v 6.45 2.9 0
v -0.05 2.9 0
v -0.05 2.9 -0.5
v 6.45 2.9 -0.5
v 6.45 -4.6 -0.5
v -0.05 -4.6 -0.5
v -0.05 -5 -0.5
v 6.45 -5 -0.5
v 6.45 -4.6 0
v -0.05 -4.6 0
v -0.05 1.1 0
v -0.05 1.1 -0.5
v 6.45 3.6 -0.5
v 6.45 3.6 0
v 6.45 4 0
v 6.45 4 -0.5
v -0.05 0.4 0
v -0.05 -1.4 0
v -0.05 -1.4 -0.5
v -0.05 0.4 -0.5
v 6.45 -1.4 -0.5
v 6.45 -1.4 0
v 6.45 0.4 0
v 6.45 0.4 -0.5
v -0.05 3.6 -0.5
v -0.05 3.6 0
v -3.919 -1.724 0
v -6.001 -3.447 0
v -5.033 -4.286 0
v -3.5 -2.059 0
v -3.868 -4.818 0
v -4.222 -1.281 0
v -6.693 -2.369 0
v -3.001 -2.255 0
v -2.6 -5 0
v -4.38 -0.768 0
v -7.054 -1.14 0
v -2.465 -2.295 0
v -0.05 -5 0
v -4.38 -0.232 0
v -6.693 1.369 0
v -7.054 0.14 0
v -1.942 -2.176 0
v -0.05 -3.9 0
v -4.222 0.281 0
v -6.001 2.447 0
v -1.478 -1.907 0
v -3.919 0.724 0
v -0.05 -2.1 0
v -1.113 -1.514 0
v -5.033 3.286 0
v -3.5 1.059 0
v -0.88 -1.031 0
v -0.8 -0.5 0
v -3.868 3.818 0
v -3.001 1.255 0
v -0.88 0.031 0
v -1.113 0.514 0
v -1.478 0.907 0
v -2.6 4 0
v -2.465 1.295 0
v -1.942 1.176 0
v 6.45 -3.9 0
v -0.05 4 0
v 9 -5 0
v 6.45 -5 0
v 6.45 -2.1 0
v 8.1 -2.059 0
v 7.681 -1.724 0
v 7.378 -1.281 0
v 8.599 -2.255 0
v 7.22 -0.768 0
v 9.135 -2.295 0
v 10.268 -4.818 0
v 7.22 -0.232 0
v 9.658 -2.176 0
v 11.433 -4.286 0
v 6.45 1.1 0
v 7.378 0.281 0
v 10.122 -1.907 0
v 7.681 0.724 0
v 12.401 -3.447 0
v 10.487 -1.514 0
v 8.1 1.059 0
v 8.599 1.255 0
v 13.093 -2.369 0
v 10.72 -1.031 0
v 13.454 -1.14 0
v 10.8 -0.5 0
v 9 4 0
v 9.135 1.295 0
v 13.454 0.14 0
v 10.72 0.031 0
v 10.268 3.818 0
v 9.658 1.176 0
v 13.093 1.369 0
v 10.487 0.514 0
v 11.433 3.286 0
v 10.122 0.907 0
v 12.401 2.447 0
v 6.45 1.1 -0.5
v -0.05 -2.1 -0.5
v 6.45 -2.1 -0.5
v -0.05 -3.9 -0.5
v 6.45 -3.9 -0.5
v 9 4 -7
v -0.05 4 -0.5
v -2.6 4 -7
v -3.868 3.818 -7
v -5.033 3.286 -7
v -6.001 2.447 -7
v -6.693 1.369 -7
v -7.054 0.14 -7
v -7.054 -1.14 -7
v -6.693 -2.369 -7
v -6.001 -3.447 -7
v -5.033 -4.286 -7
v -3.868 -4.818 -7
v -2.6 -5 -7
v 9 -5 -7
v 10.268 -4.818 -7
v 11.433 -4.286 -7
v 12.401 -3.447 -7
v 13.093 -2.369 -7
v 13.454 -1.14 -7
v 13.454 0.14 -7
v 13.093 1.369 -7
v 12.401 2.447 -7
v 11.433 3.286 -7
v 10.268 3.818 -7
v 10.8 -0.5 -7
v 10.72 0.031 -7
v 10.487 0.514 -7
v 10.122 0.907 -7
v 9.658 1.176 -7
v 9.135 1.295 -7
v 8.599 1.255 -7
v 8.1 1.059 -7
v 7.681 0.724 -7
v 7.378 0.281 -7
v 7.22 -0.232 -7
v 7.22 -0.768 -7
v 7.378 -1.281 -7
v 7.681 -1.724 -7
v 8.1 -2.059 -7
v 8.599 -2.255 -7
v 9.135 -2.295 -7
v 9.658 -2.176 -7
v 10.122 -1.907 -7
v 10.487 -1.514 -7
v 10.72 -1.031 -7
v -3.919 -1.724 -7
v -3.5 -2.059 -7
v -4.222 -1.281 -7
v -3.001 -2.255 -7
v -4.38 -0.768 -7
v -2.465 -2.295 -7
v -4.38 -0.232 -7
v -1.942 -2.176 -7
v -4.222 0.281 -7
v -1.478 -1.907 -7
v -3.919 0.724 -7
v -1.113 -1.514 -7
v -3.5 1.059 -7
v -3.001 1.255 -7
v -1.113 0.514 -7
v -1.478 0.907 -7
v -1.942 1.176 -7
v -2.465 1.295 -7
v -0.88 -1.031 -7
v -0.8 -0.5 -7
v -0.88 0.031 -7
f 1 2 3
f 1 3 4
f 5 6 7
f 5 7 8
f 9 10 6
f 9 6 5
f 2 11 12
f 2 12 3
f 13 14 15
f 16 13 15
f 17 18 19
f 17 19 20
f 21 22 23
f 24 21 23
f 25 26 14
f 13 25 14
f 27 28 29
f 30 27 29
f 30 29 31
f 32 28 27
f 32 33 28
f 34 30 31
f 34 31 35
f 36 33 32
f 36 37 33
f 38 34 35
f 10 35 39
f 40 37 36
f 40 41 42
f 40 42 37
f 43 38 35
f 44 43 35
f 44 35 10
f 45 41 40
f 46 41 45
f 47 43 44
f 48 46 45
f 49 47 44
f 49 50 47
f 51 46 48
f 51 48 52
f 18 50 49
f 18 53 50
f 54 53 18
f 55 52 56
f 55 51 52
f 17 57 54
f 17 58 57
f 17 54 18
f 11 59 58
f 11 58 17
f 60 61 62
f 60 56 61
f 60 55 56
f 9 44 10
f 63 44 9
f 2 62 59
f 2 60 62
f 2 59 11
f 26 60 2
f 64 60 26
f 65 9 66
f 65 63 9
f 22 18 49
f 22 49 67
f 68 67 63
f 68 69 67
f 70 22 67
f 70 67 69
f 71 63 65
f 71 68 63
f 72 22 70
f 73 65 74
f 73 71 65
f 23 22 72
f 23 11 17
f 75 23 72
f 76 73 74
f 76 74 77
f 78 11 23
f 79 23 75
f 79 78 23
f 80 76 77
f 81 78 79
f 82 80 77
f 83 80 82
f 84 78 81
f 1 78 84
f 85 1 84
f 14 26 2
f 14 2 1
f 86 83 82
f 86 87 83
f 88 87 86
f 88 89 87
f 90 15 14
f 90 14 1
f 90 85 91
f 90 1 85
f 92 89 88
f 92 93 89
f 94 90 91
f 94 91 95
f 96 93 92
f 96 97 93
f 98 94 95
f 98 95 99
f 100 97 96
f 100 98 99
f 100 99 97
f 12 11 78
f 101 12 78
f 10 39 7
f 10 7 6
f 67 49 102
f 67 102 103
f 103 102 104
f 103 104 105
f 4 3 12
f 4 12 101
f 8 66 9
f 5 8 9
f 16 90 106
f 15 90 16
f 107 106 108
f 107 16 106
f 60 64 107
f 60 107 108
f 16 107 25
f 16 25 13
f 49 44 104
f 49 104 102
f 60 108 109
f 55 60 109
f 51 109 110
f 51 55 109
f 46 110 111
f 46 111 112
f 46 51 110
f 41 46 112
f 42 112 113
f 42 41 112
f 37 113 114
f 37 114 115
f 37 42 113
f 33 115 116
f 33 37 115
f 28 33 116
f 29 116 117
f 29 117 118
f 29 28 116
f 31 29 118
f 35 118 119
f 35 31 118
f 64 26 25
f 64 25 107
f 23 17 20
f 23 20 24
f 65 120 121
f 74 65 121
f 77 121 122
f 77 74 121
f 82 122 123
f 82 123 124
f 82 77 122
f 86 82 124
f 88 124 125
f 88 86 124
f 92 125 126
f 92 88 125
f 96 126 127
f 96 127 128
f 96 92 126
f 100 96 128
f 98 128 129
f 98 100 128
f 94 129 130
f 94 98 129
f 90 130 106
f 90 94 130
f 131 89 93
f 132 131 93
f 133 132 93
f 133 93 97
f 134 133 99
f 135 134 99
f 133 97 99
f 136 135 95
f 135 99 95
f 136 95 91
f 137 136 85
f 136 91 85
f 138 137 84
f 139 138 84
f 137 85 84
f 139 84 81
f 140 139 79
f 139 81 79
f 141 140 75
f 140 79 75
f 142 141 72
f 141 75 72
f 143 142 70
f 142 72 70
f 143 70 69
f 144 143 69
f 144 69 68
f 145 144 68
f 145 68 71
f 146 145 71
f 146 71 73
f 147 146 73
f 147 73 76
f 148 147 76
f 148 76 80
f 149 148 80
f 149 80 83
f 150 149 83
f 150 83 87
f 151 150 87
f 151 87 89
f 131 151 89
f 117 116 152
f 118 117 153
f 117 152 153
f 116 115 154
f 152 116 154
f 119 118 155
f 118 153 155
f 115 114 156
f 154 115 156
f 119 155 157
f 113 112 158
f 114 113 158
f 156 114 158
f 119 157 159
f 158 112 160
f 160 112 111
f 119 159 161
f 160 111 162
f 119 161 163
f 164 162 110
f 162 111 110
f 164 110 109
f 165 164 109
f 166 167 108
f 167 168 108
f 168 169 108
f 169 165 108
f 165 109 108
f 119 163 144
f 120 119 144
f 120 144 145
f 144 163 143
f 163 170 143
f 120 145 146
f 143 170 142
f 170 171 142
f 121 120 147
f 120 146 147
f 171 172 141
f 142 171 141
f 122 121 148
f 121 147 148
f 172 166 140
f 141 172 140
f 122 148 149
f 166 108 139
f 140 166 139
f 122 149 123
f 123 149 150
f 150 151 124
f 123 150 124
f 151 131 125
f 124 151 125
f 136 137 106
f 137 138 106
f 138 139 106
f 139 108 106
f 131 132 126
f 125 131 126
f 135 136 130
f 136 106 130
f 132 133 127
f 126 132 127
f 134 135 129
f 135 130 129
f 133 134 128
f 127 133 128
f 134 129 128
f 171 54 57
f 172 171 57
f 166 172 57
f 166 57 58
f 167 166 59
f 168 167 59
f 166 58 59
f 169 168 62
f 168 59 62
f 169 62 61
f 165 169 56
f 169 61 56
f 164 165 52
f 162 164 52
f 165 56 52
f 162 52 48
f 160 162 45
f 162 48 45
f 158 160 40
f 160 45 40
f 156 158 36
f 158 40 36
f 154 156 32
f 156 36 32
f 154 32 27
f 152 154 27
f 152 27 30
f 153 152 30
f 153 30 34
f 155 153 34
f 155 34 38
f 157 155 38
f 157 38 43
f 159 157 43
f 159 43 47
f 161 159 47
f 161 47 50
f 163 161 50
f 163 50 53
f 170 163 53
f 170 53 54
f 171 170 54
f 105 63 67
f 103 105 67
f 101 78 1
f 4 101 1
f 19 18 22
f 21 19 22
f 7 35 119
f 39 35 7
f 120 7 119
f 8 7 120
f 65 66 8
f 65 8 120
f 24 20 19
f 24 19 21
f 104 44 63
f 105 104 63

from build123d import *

# Parameters (mm, degrees)
BOSS_EXTRUDE1_DEPTH = 7
SKETCH5_R           = 1.799999865
SKETCH5_R_2         = 1.8
CUT_EXTRUDE4_DEPTH  = 8
SKETCH2_W           = 6.5
SKETCH2_H           = 1.8
SKETCH2_H_2         = 0.9
CUT_EXTRUDE1_DEPTH  = 0.5


with BuildPart() as part:
    # Sketch1 → Boss-Extrude1 (new body)
    with BuildSketch(Plane.XY):
        with BuildLine():
            Line((9, 4), (-2.6, 4))
            ThreePointArc((-2.6, 4), (-7.1, -0.5), (-2.6, -5))
            Line((-2.6, -5), (9, -5))
            ThreePointArc((9, -5), (13.5, -0.5), (9, 4))
        make_face()
    extrude(amount=-BOSS_EXTRUDE1_DEPTH)

    # Sketch5 → Cut-Extrude4 (cut, through all)
    with BuildSketch(Plane.XY):
        with Locations((9, -0.5)):
            Circle(SKETCH5_R)
        with Locations((-2.6, -0.5)):
            Circle(SKETCH5_R_2)
    extrude(amount=-CUT_EXTRUDE4_DEPTH, mode=Mode.SUBTRACT)

    # Sketch2 → Cut-Extrude1 (cut)
    with BuildSketch(Plane.XY):
        with Locations((3.200000135, 2)):
            Rectangle(SKETCH2_W, SKETCH2_H)
        with Locations((3.200000135, -5.05)):
            Rectangle(SKETCH2_W, SKETCH2_H_2)
        with Locations((3.200000135, -0.5)):
            Rectangle(SKETCH2_W, SKETCH2_H)
        with Locations((3.200000135, -3)):
            Rectangle(SKETCH2_W, SKETCH2_H)
        with Locations((3.200000135, 4.05)):
            Rectangle(SKETCH2_W, SKETCH2_H_2)
    extrude(amount=-CUT_EXTRUDE1_DEPTH, mode=Mode.SUBTRACT)


solid = part.part
